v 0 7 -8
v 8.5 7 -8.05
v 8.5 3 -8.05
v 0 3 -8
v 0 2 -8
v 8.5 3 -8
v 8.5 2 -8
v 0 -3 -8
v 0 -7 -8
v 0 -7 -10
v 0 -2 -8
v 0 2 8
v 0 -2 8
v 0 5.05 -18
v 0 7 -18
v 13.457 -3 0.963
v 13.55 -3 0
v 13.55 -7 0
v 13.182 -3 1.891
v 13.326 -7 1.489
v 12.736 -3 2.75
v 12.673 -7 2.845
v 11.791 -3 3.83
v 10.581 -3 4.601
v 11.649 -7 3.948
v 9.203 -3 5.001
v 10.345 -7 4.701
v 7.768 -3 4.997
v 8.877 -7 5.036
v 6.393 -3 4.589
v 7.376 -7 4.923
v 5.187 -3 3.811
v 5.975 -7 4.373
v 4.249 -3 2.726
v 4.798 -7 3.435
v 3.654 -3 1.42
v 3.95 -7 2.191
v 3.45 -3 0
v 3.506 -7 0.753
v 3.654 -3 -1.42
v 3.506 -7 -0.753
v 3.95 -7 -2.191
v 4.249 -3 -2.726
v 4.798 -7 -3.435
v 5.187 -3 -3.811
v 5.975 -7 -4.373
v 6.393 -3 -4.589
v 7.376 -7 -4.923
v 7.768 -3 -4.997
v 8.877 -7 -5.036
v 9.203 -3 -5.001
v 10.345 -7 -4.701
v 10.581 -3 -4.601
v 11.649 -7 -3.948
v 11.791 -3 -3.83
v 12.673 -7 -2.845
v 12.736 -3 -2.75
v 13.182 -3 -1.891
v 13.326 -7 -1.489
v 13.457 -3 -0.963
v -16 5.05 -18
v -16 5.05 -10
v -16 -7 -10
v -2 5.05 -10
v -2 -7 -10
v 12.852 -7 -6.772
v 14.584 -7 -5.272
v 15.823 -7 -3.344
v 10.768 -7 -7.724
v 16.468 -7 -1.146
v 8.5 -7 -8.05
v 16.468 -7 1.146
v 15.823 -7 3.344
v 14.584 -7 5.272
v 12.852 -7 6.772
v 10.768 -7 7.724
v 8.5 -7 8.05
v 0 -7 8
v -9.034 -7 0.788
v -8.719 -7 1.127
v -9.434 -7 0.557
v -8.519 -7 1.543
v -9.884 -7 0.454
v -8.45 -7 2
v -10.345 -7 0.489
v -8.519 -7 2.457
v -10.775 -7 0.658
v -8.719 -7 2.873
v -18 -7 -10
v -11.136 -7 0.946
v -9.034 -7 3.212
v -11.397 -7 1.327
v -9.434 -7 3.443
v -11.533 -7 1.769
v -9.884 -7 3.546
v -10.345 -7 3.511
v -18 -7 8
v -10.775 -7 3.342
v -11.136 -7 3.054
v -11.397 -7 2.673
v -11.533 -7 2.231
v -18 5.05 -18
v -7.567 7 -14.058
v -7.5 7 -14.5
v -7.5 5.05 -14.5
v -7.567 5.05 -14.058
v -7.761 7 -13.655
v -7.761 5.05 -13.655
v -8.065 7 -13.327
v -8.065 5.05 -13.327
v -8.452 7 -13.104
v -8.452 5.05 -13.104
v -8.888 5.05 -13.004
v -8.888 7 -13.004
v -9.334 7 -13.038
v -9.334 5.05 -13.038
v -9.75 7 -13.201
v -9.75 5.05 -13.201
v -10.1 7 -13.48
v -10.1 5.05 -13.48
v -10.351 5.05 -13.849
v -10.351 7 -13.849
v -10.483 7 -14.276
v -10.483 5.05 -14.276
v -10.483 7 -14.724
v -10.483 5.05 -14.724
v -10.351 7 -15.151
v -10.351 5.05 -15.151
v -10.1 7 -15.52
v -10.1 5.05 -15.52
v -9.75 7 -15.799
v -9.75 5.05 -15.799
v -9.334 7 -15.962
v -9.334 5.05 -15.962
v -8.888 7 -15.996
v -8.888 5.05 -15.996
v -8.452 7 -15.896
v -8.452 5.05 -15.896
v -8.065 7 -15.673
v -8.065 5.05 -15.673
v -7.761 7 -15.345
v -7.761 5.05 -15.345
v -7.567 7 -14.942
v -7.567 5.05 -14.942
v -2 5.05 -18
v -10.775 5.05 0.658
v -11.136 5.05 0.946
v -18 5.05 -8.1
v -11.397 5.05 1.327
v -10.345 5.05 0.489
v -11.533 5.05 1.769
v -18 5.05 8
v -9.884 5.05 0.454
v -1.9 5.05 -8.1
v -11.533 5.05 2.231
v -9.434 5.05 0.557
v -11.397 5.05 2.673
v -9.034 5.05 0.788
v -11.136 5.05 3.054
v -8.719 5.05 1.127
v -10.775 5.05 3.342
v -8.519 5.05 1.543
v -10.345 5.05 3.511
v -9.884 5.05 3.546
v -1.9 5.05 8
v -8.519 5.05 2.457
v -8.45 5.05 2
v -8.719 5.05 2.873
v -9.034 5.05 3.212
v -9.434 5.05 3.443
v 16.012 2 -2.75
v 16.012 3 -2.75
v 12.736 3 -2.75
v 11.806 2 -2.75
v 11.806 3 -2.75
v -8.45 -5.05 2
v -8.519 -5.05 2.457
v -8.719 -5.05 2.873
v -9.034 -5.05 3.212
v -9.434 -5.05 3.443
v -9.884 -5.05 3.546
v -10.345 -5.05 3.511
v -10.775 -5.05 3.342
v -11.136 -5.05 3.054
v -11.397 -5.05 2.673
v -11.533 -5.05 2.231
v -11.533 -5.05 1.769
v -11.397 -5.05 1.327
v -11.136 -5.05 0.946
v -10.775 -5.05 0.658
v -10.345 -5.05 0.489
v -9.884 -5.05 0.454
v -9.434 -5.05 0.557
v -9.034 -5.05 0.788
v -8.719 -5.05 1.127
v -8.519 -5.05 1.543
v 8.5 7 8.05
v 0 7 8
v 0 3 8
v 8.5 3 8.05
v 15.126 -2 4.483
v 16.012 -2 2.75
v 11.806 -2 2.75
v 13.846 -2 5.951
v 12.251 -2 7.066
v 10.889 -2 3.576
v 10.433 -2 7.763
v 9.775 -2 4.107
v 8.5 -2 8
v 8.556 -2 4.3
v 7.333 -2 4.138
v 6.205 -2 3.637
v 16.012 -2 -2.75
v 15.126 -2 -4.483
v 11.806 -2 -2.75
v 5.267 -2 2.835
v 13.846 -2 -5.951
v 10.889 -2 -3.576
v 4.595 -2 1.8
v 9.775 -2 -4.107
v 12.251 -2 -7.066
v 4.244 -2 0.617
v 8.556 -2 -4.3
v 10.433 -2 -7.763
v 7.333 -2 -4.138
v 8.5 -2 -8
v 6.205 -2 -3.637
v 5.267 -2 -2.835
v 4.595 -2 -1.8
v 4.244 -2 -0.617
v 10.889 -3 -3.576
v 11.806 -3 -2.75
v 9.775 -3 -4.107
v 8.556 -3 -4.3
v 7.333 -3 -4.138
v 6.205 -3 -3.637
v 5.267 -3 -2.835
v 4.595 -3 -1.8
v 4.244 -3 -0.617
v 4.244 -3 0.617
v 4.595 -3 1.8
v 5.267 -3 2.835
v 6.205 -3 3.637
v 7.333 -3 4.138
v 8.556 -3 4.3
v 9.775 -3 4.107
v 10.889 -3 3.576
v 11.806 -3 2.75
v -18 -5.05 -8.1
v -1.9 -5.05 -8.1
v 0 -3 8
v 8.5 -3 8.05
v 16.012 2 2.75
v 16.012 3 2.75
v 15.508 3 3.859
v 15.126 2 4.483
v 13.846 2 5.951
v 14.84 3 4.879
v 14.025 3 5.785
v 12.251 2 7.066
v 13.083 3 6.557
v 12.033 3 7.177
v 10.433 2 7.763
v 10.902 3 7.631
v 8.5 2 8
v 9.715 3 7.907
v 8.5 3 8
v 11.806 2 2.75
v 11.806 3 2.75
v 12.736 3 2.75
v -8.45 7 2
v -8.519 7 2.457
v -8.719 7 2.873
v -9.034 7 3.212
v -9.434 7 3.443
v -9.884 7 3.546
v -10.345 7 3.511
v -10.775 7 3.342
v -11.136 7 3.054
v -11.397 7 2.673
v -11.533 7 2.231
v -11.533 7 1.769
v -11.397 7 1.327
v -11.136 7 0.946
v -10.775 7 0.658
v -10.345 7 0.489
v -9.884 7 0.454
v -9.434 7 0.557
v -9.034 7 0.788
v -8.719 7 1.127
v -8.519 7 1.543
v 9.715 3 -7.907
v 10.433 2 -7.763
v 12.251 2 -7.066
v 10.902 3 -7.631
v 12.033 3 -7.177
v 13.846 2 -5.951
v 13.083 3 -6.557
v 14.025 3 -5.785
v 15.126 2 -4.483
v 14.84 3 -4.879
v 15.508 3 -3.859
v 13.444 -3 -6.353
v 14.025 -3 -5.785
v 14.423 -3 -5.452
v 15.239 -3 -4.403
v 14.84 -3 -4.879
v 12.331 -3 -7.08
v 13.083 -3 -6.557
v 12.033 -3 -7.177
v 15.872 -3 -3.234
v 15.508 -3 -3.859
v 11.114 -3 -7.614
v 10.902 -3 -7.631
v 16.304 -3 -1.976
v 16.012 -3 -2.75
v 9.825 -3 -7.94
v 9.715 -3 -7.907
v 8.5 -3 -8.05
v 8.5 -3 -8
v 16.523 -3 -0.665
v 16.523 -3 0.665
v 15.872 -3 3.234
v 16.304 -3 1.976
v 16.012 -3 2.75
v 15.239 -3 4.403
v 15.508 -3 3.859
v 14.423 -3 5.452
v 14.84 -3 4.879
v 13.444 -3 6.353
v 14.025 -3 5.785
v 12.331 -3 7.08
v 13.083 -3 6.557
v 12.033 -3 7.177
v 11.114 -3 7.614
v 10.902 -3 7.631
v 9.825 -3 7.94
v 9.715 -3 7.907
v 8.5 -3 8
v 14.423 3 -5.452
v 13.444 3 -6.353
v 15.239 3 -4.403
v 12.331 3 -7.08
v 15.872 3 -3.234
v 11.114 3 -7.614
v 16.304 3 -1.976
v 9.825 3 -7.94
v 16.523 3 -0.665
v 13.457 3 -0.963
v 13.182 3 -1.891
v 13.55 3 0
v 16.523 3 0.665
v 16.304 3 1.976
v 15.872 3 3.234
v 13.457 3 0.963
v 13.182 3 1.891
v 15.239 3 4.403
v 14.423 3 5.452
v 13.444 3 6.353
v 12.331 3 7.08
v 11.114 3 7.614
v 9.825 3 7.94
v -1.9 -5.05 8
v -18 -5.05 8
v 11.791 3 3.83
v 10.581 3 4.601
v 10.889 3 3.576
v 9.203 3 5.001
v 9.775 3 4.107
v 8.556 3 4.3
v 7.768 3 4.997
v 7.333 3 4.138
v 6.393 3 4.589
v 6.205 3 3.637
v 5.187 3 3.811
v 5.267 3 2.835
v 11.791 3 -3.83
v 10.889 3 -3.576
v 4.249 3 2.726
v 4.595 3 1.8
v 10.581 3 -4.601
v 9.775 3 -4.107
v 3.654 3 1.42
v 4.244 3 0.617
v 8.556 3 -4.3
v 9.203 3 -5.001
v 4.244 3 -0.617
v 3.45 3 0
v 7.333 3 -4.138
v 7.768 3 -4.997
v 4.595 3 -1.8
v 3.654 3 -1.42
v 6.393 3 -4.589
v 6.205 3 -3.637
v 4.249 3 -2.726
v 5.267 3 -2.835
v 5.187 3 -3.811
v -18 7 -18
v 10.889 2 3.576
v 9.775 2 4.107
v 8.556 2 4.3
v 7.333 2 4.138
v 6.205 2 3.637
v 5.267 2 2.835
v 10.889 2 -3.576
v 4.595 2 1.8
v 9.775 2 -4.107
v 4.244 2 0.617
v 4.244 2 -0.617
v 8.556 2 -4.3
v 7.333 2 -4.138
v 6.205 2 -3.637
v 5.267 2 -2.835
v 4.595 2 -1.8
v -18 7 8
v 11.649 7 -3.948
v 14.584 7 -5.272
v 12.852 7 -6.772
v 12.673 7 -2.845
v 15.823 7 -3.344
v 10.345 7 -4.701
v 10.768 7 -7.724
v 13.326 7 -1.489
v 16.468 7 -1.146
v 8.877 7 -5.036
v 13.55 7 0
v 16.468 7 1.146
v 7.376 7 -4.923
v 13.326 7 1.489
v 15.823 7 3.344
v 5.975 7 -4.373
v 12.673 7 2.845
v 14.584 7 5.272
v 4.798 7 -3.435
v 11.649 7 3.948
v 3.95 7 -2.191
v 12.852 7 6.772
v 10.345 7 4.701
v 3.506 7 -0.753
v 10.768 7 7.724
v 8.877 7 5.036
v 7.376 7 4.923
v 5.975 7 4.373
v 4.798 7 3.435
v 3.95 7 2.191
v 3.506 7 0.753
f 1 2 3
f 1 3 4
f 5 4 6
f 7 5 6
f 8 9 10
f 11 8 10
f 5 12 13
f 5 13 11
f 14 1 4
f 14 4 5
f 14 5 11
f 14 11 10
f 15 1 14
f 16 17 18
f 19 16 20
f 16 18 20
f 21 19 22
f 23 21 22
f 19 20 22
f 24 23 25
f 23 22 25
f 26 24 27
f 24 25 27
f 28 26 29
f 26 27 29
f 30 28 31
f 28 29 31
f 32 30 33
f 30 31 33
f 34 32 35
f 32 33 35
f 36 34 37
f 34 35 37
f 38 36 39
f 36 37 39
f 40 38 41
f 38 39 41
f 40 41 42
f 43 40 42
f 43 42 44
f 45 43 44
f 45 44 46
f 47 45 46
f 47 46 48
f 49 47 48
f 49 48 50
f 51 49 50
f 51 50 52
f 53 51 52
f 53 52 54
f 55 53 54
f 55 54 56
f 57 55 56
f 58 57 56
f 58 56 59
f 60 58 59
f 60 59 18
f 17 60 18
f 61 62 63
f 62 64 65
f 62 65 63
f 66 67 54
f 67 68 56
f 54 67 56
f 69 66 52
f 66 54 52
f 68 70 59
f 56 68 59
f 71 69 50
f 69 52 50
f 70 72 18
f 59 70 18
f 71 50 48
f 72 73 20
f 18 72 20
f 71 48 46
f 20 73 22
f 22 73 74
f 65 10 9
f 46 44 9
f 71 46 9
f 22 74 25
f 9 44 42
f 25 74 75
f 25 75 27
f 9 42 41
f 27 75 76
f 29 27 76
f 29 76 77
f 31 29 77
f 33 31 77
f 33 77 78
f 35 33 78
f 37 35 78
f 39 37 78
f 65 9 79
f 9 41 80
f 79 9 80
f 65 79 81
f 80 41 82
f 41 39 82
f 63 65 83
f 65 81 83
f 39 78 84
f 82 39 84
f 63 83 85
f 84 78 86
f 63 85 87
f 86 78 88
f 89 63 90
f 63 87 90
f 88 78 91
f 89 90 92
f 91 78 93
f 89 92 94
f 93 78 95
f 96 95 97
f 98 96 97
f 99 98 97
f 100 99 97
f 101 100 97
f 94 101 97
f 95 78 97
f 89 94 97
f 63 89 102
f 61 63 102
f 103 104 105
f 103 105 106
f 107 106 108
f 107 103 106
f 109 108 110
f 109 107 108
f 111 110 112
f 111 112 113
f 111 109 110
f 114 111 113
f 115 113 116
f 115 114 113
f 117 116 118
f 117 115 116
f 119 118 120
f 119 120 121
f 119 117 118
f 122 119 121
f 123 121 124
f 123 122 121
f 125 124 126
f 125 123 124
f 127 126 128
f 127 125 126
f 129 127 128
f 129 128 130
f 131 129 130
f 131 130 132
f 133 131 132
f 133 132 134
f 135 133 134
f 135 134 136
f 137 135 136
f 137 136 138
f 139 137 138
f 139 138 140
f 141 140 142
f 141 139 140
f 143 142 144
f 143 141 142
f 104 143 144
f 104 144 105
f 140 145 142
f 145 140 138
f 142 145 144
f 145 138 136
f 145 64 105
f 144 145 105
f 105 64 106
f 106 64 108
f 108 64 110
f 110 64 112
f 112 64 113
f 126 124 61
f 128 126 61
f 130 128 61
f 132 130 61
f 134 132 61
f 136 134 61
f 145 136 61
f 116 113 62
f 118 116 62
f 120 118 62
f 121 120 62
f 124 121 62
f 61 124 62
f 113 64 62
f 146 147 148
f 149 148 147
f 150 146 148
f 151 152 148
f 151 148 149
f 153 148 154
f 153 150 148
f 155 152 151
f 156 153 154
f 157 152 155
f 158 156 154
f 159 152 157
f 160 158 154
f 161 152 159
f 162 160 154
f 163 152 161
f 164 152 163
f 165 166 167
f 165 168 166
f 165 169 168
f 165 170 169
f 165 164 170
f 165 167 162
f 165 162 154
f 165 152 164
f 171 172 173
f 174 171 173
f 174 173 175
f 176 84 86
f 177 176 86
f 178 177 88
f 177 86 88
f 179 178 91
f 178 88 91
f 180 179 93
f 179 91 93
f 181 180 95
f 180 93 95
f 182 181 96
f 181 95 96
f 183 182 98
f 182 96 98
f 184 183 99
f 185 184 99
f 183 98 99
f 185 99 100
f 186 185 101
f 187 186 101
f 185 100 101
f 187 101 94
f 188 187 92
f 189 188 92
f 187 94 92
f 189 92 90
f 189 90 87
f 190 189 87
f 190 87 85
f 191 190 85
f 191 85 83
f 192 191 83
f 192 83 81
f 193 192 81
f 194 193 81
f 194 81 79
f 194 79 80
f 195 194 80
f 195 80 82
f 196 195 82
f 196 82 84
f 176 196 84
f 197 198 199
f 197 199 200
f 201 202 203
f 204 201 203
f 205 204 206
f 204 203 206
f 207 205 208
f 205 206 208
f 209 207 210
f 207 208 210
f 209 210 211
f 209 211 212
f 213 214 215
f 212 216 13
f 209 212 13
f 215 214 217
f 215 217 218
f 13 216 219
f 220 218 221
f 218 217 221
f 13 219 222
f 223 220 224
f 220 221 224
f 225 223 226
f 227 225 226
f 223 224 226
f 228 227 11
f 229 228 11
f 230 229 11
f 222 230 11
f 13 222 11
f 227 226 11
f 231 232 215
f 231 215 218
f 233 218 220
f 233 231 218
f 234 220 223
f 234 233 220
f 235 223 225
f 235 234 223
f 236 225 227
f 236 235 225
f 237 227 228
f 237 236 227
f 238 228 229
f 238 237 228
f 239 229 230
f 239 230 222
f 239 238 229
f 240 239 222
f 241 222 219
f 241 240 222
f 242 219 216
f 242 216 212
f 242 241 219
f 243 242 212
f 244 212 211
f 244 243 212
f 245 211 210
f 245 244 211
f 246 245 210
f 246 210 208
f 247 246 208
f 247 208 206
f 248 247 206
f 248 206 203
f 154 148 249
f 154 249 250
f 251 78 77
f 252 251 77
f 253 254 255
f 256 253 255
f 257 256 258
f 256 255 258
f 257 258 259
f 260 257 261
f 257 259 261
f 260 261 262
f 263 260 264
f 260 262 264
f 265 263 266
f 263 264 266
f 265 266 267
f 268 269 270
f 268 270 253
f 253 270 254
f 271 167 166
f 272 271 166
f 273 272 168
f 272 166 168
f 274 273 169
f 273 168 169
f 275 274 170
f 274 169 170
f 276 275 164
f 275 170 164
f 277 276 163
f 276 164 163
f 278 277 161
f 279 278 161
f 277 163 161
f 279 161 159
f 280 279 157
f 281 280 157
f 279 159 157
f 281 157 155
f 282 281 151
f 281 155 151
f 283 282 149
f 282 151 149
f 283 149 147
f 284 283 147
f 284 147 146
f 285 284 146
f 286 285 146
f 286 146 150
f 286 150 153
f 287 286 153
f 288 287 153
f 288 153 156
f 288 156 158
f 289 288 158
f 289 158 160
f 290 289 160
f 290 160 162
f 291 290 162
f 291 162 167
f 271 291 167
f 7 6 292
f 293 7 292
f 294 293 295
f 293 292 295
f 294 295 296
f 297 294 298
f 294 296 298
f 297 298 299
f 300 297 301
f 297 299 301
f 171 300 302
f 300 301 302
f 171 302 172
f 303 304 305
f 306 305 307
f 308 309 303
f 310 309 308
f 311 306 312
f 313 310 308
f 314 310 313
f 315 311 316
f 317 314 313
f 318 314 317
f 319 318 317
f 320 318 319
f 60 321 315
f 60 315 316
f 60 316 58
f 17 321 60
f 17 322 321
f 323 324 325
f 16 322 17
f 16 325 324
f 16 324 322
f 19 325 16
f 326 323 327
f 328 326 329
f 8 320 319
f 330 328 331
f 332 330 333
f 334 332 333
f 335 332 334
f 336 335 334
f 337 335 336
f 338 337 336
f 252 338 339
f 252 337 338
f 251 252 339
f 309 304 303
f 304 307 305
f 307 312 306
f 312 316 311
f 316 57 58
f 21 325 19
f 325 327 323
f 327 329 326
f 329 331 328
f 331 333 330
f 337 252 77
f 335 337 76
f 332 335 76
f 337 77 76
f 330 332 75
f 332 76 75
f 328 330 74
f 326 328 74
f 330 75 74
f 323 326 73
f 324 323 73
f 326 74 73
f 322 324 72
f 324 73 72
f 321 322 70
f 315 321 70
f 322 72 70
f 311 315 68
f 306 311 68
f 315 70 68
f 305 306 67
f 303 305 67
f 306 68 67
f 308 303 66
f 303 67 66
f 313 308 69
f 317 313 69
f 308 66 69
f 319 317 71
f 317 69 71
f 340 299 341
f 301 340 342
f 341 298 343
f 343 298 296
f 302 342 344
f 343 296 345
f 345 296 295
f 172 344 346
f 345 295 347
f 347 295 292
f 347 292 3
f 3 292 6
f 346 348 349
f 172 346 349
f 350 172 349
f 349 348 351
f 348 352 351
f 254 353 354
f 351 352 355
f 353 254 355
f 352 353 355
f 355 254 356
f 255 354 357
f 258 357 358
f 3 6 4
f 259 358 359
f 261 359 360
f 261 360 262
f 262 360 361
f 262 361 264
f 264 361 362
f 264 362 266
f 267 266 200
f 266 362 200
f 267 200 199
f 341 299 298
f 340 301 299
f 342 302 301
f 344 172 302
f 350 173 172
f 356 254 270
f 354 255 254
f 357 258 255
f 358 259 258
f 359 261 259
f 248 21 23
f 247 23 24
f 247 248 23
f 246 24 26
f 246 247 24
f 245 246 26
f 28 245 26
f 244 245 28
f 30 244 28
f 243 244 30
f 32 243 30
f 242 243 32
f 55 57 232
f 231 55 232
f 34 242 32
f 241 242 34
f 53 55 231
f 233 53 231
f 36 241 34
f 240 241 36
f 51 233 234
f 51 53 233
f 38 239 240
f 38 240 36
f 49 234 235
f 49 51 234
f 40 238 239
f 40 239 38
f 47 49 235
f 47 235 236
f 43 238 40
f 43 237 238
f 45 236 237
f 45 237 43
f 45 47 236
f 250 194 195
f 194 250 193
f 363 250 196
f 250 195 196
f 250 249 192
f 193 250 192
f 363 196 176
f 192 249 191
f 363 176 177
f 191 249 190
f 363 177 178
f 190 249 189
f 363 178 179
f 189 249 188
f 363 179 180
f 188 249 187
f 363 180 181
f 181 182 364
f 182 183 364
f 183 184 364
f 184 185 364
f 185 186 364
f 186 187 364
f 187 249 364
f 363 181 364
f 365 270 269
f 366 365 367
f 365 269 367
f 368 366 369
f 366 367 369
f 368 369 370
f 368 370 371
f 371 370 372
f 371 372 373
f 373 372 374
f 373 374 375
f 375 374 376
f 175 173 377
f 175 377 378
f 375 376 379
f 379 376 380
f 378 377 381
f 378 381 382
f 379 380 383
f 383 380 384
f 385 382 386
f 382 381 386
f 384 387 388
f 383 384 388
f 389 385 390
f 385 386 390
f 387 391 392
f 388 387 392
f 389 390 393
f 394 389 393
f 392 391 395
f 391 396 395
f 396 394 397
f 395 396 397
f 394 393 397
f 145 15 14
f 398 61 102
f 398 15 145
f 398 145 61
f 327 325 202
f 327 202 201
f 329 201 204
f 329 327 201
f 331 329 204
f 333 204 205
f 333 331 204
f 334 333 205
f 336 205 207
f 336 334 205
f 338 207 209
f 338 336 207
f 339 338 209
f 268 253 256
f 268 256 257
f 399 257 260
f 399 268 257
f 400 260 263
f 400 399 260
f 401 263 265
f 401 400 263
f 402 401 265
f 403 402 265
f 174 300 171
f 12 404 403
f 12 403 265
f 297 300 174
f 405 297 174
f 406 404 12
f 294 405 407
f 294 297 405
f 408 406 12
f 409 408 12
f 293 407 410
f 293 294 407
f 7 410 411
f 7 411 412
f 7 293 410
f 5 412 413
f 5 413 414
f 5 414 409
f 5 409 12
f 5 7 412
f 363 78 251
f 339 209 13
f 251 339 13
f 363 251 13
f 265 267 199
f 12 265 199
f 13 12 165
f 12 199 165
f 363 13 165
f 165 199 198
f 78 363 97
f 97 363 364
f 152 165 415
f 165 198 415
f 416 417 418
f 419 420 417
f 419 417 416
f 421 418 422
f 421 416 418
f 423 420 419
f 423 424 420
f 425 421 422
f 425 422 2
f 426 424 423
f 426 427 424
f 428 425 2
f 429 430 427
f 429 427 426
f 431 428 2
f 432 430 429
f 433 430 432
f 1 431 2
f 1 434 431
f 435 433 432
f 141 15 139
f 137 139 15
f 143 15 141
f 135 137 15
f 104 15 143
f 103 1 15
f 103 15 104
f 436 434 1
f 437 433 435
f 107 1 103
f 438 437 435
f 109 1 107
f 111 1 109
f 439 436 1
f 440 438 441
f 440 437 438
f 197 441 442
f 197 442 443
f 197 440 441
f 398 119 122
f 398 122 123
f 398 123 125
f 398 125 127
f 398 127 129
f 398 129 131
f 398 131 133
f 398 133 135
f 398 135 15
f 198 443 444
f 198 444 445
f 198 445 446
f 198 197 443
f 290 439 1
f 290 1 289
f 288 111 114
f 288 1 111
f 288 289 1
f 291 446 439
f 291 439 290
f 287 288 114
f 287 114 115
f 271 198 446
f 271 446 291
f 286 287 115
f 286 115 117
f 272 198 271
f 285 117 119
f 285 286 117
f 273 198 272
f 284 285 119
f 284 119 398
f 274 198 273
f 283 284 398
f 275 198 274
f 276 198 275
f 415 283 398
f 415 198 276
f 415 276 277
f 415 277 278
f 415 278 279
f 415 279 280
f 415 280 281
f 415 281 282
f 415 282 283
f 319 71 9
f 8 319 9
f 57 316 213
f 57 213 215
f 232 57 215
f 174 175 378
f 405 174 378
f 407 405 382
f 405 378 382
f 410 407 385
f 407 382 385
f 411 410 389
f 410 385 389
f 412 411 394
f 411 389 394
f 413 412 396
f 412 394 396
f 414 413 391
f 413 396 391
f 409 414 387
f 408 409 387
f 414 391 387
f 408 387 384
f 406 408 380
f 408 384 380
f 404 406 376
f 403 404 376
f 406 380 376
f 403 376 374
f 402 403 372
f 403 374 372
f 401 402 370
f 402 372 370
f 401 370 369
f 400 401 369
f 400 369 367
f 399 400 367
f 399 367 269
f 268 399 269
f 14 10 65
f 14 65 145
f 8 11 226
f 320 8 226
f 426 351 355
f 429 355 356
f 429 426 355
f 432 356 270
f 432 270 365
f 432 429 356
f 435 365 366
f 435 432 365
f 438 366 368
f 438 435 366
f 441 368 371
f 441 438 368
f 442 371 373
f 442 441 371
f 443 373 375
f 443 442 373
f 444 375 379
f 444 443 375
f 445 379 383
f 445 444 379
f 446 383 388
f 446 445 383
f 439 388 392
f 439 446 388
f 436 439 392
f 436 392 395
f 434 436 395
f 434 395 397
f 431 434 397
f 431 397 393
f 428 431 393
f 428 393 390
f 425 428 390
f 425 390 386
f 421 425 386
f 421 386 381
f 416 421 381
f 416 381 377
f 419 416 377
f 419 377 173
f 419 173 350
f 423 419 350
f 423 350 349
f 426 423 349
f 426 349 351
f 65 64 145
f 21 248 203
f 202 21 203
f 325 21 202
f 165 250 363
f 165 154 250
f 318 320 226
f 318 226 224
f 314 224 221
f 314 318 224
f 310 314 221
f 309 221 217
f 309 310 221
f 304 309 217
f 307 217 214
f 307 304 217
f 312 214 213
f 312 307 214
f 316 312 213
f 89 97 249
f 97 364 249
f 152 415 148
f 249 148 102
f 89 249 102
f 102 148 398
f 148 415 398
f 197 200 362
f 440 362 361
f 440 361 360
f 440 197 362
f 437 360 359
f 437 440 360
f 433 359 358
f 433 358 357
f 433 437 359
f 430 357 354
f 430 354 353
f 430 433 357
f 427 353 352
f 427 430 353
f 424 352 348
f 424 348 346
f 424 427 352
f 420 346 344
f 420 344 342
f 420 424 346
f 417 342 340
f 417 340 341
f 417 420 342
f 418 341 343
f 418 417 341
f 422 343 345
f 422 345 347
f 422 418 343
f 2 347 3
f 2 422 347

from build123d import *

# Parameters (mm, degrees)
SKETCH1_W           = 18
SKETCH1_H           = 16
BOSS_EXTRUDE1_DEPTH = 7
SKETCH4_W           = 16
SKETCH4_H           = 10.1
CUT_EXTRUDE1_DEPTH  = 16.1
SKETCH5_R           = 5.05
BOSS_EXTRUDE2_DEPTH = 4
SKETCH7_W           = 18
SKETCH7_H           = 1.95
BOSS_EXTRUDE3_DEPTH = 10
SKETCH8_R           = 1.5
CUT_EXTRUDE2_DEPTH  = 1.95
BOSS_EXTRUDE4_DEPTH = 1
SKETCH10_R          = 1.55
CUT_EXTRUDE3_DEPTH  = 14
SKETCH13_W          = 18
SKETCH13_H          = 12.05
BOSS_EXTRUDE6_DEPTH = 2
BOSS_EXTRUDE7_DEPTH = 2
SKETCH15_W          = 16.1
SKETCH15_H          = 10.1
CUT_EXTRUDE4_DEPTH  = 0.1


with BuildPart() as part:
    # Sketch1 → Boss-Extrude1 (new body, symmetric)
    with BuildSketch(Plane(origin=(0, 0, 0), x_dir=(1, 0, 0), z_dir=(0, 1, 0))):
        with Locations((-9, 0)):
            Rectangle(SKETCH1_W, SKETCH1_H)
    extrude(amount=BOSS_EXTRUDE1_DEPTH, both=True)

    # Sketch4 → Cut-Extrude1 (cut)
    with BuildSketch(Plane.ZY.offset(18)):
        Rectangle(SKETCH4_W, SKETCH4_H)
    extrude(amount=-CUT_EXTRUDE1_DEPTH, mode=Mode.SUBTRACT)

    # Sketch5 → Boss-Extrude2 (add)
    with BuildSketch(Plane.XZ.offset(7)):
        with BuildLine():
            Line((0, 8), (8.5, 8.05))
            ThreePointArc((8.5, 8.05), (16.55, 0), (8.5, -8.05))
            Line((8.5, -8.05), (0, -8))
            Line((0, -8), (0, 8))
        make_face()
        with Locations((8.5, 0)):
            Circle(SKETCH5_R, mode=Mode.SUBTRACT)
    boss_extrude2 = extrude(amount=-BOSS_EXTRUDE2_DEPTH)

    # Mirror1: Boss-Extrude2 across plane
    add(boss_extrude2.mirror(Plane(origin=(0, 0, 0), x_dir=(0, 0, 1), z_dir=(0, -1, 0))))

    # Sketch7 → Boss-Extrude3 (add)
    with BuildSketch(Plane(origin=(0, 0, -8), x_dir=(-1, 0, 0), z_dir=(0, 0, -1))):
        with Locations((9, 6.025)):
            Rectangle(SKETCH7_W, SKETCH7_H)
    extrude(amount=BOSS_EXTRUDE3_DEPTH)

    # Sketch8 → Cut-Extrude2 (cut)
    with BuildSketch(Plane.XZ.offset(-7)):
        with Locations((-9, -14.5)):
            Circle(SKETCH8_R)
    extrude(amount=CUT_EXTRUDE2_DEPTH, mode=Mode.SUBTRACT)

    # Sketch9 → Boss-Extrude4 (add)
    with BuildSketch(Plane(origin=(0, -3, 0), x_dir=(1, 0, 0), z_dir=(0, 1, 0))):
        with BuildLine():
            Line((11.805676935, -2.75), (16.012489601, -2.75))
            ThreePointArc((16.012489601, -2.75), (13.082575695, -6.557438524), (8.5, -8))
            Line((8.5, -8), (0, -8))
            Line((0, -8), (0, 8))
            Line((0, 8), (8.5, 8))
            ThreePointArc((8.5, 8), (13.082575695, 6.557438524), (16.012489601, 2.75))
            Line((16.012489601, 2.75), (11.805676935, 2.75))
            ThreePointArc((11.805676935, 2.75), (4.2, 0), (11.805676935, -2.75))
        make_face()
    boss_extrude4 = extrude(amount=BOSS_EXTRUDE4_DEPTH)

    # Mirror2: Boss-Extrude4 across plane
    add(boss_extrude4.mirror(Plane(origin=(0, 0, 0), x_dir=(0, 0, 1), z_dir=(0, -1, 0))))

    # Sketch10 → Cut-Extrude3 (cut)
    with BuildSketch(Plane.XZ.offset(7)):
        with Locations((-10, 2)):
            Circle(SKETCH10_R)
    extrude(amount=-CUT_EXTRUDE3_DEPTH, mode=Mode.SUBTRACT)

    # Sketch13 → Boss-Extrude6 (add)
    with BuildSketch(Plane(origin=(0, 0, -8), x_dir=(-1, 0, 0), z_dir=(0, 0, -1))):
        with Locations((9, -0.975)):
            Rectangle(SKETCH13_W, SKETCH13_H)
    extrude(amount=BOSS_EXTRUDE6_DEPTH)

    # Sketch14 → Boss-Extrude7 (add)
    with BuildSketch(Plane(origin=(0, 0, 0), x_dir=(0, 0, -1), z_dir=(1, 0, 0))):
        Polygon((10, -7), (18, 5.05), (10, 5.05), align=None)
    boss_extrude7 = extrude(amount=-BOSS_EXTRUDE7_DEPTH)

    # Mirror3: Boss-Extrude7 across plane
    add(boss_extrude7.mirror(Plane(origin=(-9, 0, 0), x_dir=(0, 0, 1), z_dir=(1, 0, 0))))

    # Sketch15 → Cut-Extrude4 (cut)
    with BuildSketch(Plane.XY.offset(-8)):
        with Locations((-9.95, 0)):
            Rectangle(SKETCH15_W, SKETCH15_H)
    extrude(amount=-CUT_EXTRUDE4_DEPTH, mode=Mode.SUBTRACT)


solid = part.part
